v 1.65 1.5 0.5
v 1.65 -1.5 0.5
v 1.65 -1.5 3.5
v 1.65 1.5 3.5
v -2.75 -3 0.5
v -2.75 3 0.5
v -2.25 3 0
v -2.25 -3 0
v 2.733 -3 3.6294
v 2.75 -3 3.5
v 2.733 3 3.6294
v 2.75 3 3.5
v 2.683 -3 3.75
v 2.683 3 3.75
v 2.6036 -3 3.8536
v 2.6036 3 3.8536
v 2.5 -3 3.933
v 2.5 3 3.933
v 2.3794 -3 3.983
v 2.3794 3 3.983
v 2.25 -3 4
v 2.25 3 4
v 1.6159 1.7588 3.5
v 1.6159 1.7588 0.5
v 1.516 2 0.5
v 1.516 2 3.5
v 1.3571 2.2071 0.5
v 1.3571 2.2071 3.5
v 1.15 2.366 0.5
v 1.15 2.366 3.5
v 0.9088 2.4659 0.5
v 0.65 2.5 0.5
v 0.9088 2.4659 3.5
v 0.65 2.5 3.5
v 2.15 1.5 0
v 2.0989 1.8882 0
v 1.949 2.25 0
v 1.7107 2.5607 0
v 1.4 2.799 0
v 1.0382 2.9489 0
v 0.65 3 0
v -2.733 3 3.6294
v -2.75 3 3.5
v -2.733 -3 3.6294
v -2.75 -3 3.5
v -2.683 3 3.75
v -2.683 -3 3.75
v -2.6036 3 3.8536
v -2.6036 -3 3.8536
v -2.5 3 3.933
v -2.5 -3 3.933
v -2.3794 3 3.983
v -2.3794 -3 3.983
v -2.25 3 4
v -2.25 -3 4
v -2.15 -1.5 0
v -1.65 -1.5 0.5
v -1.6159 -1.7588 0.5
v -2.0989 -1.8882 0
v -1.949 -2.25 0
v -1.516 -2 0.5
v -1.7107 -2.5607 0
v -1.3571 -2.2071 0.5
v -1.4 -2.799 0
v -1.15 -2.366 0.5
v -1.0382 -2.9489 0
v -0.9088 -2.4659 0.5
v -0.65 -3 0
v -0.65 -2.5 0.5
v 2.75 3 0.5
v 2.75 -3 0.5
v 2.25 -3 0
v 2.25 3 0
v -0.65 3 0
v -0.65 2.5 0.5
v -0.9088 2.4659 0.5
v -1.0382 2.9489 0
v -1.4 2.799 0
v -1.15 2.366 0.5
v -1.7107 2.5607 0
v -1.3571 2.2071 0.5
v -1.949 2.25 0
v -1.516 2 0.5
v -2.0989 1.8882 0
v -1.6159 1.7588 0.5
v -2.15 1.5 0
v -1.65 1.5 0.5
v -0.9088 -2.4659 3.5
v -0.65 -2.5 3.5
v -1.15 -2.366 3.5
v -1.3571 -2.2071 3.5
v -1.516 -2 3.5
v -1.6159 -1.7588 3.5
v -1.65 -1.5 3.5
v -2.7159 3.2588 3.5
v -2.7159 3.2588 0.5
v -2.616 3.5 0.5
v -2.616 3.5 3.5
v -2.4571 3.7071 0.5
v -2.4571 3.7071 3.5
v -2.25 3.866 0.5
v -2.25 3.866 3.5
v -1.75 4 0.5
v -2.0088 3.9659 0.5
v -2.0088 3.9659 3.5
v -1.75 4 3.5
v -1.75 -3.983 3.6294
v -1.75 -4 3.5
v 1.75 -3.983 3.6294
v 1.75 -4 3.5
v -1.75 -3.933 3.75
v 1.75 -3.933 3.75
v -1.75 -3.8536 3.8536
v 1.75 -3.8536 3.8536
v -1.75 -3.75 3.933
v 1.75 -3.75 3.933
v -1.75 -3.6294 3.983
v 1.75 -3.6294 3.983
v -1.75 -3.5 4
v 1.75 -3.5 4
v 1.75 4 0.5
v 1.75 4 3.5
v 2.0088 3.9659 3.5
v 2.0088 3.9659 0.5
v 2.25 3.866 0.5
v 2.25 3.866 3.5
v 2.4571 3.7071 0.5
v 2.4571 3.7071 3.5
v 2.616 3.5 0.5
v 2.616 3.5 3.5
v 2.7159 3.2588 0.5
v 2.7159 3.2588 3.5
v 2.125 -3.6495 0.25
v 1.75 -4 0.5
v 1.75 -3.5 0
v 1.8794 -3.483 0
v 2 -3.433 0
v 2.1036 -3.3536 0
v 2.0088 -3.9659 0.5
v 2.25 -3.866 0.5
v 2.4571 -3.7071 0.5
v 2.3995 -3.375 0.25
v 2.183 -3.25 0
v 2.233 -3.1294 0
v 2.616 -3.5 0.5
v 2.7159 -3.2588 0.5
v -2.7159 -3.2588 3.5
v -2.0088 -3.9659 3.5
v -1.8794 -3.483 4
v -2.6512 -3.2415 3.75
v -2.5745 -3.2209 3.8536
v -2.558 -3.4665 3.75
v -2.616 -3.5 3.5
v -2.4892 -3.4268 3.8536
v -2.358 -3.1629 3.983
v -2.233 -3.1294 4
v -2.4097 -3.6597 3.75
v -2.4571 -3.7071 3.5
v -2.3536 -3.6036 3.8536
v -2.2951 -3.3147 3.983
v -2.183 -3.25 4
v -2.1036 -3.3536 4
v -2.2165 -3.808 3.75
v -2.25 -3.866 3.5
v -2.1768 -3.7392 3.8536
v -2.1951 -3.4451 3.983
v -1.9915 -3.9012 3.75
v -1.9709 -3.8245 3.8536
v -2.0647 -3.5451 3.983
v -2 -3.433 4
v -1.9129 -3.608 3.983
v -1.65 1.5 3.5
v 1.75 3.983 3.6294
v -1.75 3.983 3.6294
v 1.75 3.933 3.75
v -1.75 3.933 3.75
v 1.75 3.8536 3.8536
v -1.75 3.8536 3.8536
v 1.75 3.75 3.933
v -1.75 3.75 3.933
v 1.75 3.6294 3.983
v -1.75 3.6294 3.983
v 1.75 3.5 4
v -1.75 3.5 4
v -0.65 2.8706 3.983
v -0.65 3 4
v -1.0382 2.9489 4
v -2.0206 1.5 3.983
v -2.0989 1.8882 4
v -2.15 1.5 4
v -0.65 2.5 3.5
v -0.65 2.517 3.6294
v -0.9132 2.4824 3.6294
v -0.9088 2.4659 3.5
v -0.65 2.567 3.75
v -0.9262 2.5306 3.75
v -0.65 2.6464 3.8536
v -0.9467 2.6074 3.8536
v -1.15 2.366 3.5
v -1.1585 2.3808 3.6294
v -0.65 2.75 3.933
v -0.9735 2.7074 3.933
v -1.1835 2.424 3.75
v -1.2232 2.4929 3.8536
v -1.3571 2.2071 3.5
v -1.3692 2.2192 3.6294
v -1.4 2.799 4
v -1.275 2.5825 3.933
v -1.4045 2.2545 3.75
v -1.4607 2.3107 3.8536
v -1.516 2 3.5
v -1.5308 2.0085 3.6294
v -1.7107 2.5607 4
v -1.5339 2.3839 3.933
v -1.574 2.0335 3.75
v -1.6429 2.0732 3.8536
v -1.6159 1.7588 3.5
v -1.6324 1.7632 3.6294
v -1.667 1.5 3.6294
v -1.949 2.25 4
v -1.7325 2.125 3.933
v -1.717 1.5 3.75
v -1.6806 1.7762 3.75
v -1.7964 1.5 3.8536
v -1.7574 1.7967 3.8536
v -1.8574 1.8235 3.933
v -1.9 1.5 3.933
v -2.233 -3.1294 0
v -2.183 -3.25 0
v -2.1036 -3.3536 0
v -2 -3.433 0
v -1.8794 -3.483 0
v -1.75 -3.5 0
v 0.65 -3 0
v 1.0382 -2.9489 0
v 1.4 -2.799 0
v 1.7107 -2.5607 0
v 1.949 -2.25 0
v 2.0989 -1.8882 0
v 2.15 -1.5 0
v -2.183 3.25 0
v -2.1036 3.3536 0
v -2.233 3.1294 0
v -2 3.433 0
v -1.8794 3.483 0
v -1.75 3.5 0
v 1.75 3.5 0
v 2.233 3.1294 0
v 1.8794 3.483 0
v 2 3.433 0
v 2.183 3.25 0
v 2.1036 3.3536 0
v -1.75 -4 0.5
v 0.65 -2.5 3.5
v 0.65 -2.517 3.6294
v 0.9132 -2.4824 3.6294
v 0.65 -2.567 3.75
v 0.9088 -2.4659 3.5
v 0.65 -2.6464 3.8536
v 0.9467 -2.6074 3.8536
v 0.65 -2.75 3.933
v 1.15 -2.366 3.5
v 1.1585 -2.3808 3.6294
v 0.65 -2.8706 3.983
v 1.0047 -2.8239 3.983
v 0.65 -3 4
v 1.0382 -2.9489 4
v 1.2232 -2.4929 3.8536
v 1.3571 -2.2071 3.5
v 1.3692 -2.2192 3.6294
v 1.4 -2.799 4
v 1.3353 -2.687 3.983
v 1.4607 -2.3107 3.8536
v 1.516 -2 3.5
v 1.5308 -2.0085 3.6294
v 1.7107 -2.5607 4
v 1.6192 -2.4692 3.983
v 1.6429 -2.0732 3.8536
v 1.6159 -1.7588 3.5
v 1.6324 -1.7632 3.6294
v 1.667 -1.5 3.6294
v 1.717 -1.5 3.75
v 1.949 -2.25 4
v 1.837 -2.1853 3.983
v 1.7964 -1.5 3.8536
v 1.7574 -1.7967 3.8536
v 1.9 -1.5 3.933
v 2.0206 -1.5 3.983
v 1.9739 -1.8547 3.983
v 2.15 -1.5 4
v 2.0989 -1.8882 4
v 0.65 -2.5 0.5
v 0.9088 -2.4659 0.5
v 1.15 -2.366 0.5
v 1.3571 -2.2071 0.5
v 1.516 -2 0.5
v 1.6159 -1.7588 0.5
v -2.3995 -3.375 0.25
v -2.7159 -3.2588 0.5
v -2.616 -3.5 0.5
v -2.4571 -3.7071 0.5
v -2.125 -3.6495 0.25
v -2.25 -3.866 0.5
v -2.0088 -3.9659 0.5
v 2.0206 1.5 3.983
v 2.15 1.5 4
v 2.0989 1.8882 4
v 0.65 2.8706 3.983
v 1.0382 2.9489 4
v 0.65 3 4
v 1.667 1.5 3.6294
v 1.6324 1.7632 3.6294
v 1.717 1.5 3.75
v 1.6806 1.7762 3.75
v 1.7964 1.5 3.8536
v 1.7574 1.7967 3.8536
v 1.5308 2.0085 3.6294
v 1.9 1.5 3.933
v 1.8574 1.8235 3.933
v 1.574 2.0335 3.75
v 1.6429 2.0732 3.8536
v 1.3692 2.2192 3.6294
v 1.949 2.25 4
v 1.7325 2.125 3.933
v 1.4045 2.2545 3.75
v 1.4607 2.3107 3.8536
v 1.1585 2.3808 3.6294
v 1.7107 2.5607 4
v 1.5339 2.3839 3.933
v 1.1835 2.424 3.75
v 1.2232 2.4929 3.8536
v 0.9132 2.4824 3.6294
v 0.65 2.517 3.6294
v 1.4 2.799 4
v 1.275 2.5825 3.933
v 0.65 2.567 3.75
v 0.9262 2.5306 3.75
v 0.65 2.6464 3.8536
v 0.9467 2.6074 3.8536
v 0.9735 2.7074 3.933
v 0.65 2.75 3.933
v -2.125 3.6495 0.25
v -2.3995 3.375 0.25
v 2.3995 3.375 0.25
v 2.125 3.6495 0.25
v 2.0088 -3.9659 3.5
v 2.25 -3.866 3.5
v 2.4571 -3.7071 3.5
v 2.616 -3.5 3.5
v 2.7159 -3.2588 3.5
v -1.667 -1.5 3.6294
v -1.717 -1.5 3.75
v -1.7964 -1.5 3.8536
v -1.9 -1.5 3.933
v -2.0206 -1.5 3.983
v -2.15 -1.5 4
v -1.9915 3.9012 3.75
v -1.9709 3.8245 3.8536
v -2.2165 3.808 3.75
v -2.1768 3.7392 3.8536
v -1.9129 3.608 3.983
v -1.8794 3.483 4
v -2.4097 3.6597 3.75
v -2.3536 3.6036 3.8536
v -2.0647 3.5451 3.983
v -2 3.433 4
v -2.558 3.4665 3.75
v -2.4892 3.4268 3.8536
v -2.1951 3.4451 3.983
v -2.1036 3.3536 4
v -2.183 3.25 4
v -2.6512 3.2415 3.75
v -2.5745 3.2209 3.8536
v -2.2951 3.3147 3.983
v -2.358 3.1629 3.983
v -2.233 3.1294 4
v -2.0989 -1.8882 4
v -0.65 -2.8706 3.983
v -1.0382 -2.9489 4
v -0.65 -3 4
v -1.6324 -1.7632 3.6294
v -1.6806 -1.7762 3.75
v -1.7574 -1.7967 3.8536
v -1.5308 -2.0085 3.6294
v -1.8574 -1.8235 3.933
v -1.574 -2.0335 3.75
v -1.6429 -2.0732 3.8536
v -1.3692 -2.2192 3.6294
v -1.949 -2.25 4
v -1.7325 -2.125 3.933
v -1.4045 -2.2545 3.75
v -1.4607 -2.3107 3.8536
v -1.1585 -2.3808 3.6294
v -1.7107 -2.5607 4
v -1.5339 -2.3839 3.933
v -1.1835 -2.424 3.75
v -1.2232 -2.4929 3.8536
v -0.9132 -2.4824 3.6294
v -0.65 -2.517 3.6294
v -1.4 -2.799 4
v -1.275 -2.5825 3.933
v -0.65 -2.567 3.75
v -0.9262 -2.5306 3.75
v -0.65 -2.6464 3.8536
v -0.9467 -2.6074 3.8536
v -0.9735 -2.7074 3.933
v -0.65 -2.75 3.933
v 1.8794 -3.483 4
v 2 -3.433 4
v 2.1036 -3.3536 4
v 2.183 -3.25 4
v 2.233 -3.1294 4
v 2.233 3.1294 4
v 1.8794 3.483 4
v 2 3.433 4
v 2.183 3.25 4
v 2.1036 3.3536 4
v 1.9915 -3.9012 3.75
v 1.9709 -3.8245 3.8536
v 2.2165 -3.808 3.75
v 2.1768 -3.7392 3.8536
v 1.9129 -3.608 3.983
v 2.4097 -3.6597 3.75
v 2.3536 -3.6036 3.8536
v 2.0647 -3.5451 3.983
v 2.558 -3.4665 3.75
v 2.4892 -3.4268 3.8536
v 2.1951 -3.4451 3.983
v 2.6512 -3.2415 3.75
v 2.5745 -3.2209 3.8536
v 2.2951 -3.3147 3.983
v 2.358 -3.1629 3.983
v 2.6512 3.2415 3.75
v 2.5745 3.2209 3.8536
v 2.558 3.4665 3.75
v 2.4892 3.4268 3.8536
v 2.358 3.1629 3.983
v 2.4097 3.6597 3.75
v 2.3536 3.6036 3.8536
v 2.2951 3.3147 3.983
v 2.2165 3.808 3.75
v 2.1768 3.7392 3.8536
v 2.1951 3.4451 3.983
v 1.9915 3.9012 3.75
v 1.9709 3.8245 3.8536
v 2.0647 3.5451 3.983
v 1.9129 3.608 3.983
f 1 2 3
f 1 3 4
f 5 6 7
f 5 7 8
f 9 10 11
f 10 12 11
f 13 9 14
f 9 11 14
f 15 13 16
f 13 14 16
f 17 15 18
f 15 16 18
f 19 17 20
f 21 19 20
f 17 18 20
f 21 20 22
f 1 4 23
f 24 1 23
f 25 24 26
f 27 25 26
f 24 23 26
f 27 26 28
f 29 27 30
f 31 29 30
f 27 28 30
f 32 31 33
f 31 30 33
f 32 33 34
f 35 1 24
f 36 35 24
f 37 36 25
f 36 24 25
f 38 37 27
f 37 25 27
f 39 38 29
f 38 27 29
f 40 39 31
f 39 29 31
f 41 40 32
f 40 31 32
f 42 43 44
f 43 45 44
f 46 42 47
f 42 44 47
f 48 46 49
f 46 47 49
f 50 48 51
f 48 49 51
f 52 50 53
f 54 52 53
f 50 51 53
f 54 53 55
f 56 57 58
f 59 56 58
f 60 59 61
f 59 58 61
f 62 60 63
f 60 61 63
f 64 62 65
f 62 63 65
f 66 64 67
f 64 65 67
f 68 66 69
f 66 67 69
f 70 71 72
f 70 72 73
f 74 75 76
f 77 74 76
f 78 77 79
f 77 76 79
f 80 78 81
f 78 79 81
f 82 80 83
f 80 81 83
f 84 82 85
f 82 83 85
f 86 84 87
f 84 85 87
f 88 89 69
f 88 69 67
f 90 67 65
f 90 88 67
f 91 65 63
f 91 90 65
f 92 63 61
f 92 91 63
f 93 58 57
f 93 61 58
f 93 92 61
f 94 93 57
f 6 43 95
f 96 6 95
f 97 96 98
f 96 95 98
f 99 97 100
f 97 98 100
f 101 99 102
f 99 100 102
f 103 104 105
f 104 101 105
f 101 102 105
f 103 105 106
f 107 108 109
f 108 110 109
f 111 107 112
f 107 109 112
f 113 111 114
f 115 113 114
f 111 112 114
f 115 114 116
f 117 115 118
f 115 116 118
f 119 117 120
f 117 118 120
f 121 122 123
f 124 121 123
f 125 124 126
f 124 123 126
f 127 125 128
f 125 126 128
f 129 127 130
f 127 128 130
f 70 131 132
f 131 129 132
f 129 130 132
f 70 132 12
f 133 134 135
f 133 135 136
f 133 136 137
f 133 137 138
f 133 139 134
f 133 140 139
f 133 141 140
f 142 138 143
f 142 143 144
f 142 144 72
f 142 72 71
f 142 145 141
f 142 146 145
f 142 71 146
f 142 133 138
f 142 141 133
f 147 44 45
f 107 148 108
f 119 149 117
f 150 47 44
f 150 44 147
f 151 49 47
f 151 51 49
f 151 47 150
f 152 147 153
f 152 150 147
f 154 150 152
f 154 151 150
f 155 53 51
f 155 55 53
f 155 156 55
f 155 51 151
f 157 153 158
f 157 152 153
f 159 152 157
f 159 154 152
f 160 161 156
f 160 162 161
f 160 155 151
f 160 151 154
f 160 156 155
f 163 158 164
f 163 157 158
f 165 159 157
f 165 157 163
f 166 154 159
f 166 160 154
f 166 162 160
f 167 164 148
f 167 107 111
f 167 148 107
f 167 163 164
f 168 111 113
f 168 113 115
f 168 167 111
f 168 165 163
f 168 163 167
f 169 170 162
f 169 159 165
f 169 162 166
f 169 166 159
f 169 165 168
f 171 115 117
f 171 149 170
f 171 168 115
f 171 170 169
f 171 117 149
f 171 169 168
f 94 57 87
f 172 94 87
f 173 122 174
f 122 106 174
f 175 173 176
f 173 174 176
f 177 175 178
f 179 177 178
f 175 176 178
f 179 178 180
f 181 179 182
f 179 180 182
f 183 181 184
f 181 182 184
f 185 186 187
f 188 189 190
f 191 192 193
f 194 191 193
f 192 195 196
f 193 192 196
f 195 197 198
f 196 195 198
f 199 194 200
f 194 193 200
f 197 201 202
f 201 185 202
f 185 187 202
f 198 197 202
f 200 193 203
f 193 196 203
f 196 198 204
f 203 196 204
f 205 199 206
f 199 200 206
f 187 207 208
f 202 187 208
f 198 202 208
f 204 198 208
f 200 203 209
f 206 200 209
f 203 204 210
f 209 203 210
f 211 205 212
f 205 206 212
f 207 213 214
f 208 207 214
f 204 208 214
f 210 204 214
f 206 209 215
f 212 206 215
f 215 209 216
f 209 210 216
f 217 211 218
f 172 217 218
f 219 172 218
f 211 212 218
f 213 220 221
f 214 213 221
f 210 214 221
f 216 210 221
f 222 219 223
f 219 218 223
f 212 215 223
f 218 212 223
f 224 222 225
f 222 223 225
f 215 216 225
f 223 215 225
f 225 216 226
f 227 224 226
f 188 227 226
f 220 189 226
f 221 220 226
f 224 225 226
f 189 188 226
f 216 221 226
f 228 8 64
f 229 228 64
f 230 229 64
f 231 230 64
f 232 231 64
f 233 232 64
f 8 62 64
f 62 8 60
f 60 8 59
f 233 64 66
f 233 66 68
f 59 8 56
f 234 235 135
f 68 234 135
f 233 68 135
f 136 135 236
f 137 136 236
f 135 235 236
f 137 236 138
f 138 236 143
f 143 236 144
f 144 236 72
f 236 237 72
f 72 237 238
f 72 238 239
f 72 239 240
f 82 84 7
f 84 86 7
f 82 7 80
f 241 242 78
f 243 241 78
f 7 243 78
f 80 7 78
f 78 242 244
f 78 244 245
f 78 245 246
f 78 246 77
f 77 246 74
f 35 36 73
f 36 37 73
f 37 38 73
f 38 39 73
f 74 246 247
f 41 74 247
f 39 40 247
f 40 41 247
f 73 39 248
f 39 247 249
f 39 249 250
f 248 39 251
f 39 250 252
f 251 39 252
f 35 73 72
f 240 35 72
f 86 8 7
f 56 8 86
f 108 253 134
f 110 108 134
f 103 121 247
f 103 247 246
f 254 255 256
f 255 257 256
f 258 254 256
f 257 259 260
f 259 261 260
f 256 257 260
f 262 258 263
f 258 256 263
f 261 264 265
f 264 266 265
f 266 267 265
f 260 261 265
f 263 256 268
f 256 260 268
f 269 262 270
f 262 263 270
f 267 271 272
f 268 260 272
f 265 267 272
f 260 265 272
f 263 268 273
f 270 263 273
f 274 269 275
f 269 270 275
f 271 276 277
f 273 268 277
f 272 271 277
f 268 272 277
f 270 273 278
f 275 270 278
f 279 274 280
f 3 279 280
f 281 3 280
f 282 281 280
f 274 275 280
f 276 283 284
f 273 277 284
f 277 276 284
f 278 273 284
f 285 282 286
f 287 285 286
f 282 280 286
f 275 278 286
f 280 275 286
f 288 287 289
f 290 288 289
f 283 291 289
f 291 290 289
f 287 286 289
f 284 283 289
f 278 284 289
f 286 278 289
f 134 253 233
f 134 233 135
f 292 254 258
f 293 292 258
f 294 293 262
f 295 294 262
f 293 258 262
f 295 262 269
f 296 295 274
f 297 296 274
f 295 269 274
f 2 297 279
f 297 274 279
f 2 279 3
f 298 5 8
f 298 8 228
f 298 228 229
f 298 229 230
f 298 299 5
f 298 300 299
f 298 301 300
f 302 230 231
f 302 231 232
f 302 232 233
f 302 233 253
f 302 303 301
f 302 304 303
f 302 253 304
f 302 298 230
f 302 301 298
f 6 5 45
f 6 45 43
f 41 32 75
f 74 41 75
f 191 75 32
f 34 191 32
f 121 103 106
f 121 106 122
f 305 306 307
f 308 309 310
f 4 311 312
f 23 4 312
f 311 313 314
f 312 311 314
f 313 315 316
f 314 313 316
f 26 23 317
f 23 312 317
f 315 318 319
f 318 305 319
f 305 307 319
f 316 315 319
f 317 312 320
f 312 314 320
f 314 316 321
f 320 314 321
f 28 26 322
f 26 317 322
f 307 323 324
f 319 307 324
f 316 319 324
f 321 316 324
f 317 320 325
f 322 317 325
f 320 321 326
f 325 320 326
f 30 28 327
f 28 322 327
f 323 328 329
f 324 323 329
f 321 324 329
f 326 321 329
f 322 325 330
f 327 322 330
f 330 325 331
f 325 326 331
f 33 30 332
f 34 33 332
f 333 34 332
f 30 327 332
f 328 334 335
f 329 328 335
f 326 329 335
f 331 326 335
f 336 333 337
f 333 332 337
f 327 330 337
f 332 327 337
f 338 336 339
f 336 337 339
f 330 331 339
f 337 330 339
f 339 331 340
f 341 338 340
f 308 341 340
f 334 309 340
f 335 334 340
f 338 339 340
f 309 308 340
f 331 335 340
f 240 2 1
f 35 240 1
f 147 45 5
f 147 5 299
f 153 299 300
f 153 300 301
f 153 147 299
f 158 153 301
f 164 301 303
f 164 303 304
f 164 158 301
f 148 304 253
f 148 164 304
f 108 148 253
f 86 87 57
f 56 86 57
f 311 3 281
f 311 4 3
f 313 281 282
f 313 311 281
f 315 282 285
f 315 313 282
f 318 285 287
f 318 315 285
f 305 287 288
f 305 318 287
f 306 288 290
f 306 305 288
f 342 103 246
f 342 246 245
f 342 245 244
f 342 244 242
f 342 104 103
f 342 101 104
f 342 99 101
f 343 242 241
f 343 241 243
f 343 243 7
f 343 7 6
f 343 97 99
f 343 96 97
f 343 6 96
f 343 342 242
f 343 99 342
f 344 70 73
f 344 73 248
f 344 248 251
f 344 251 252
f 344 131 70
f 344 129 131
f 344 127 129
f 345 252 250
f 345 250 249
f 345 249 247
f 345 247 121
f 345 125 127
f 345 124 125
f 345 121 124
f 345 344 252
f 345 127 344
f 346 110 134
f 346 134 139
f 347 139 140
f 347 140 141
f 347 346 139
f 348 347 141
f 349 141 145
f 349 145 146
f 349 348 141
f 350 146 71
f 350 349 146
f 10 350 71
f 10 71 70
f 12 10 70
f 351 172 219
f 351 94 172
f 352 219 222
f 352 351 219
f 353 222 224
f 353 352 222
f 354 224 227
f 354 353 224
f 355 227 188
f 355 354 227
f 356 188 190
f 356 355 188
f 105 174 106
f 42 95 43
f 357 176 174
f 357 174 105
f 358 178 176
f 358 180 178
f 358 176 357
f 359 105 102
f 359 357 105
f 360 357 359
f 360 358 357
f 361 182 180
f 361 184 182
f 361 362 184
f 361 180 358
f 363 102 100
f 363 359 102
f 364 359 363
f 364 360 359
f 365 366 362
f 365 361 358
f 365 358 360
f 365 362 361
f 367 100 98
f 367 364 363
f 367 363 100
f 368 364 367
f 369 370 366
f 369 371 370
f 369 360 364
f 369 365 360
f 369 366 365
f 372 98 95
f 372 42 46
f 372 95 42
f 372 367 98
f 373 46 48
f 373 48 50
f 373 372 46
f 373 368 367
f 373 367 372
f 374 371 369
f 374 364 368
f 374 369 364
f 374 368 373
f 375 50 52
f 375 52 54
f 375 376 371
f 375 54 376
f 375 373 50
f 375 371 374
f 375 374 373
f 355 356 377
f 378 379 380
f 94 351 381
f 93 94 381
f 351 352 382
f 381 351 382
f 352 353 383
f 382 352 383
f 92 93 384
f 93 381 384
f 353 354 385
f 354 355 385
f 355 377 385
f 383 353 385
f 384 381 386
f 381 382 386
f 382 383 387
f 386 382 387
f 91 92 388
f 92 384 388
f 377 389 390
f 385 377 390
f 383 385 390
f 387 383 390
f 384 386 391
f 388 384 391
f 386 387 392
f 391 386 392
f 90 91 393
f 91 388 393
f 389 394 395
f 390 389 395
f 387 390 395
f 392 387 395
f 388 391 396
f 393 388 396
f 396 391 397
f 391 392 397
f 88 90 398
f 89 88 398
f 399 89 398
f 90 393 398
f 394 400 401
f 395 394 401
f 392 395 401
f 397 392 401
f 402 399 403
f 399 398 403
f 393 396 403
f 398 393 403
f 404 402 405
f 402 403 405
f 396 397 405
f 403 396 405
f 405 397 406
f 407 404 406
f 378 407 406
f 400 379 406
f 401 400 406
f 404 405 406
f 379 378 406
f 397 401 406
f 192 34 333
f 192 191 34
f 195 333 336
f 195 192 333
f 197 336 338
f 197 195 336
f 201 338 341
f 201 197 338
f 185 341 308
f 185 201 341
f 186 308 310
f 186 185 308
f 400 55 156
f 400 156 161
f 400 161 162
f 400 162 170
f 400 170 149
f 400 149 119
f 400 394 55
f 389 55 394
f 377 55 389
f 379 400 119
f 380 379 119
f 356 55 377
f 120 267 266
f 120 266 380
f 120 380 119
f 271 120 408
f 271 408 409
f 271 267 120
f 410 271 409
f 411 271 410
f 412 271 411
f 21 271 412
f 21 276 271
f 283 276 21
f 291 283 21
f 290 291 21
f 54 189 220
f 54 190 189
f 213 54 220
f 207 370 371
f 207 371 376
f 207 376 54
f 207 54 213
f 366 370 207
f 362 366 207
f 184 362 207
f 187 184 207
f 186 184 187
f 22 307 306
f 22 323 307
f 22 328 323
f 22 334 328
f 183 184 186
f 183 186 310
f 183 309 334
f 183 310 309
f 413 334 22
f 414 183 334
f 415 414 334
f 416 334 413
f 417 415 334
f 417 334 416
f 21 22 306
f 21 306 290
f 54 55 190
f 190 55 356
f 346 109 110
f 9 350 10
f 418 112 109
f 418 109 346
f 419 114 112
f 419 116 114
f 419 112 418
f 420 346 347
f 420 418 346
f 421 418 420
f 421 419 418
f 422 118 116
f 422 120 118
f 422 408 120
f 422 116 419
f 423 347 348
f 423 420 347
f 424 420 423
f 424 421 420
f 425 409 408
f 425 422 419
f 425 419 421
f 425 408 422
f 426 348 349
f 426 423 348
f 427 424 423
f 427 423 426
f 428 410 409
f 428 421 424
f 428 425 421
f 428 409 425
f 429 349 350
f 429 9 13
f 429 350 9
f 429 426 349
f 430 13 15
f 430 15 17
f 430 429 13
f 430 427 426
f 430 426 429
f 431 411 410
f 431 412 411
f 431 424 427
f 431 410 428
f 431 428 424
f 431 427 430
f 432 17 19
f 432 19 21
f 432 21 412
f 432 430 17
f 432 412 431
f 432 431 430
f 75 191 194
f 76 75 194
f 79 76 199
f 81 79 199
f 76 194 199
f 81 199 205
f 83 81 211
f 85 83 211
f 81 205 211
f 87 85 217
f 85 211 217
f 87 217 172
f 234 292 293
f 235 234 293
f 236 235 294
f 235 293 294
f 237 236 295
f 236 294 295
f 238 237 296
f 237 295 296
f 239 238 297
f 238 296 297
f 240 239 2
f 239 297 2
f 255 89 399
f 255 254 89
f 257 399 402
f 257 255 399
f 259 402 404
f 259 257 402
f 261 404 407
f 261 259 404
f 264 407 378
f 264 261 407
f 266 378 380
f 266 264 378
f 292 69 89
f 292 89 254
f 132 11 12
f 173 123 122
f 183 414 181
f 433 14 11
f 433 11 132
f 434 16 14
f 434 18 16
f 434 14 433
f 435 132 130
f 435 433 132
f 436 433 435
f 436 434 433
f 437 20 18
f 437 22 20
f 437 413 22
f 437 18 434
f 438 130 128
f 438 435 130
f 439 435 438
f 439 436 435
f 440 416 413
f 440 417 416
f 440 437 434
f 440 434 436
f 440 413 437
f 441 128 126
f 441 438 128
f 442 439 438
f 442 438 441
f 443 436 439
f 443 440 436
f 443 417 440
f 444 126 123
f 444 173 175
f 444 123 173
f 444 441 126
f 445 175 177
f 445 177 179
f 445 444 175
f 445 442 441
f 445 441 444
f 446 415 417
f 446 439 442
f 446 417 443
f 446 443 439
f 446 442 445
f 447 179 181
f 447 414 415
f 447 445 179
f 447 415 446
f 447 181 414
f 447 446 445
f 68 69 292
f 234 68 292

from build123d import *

# Parameters (mm, degrees)
F0_W     = 5.5
F0_H     = 8
F0_W_2   = 3.3
F0_H_2   = 5
F1_DEPTH = 4
F2_R     = 1
F3_R     = 1
F4_R     = 0.5
F5_SIZE  = 0.5


with BuildPart() as f1:
    # F0 (on Top) → F1 (new body)
    with BuildSketch(Plane.XY):
        Rectangle(F0_W, F0_H)
        Rectangle(F0_W_2, F0_H_2, mode=Mode.SUBTRACT)
    extrude(amount=F1_DEPTH)

    # F2
    f2_edges = [f1.edges().sort_by_distance(p)[0] for p in [
        (-2.75, -4, 2),
        (2.75, -4, 2),
        (-2.75, 4, 2),
        (2.75, 4, 2),
    ]]
    fillet(f2_edges, radius=F2_R)

    # F3
    f3_edges = [f1.edges().sort_by_distance(p)[0] for p in [
        (1.65, 2.5, 2),
        (1.65, -2.5, 2),
        (-1.65, -2.5, 2),
        (-1.65, 2.5, 2),
    ]]
    fillet(f3_edges, radius=F3_R)

    # F4
    f4_edges = [f1.edges().sort_by_distance(p)[0] for p in [
        (1.65, 0, 4),
        (1.357107, 2.207107, 4),
        (1.357107, -2.207107, 4),
        (0, 2.5, 4),
        (0, -2.5, 4),
        (-1.357107, 2.207107, 4),
        (-1.357107, -2.207107, 4),
        (-1.65, 0, 4),
        (0, -4, 4),
        (-2.457107, -3.707107, 4),
        (2.457107, -3.707107, 4),
        (-2.75, 0, 4),
        (2.75, 0, 4),
        (-2.457107, 3.707107, 4),
        (2.457107, 3.707107, 4),
        (0, 4, 4),
    ]]
    fillet(f4_edges, radius=F4_R)

    # F5
    f5_edges = [f1.edges().sort_by_distance(p)[0] for p in [
        (1.65, 0, 0),
        (1.357107, 2.207107, 0),
        (1.357107, -2.207107, 0),
        (0, 2.5, 0),
        (0, -2.5, 0),
        (-1.357107, 2.207107, 0),
        (-1.357107, -2.207107, 0),
        (-1.65, 0, 0),
        (0, -4, 0),
        (-2.457107, -3.707107, 0),
        (2.457107, -3.707107, 0),
        (-2.75, 0, 0),
        (2.75, 0, 0),
        (-2.457107, 3.707107, 0),
        (2.457107, 3.707107, 0),
        (0, 4, 0),
    ]]
    chamfer(f5_edges, length=F5_SIZE)


solid = f1.part
